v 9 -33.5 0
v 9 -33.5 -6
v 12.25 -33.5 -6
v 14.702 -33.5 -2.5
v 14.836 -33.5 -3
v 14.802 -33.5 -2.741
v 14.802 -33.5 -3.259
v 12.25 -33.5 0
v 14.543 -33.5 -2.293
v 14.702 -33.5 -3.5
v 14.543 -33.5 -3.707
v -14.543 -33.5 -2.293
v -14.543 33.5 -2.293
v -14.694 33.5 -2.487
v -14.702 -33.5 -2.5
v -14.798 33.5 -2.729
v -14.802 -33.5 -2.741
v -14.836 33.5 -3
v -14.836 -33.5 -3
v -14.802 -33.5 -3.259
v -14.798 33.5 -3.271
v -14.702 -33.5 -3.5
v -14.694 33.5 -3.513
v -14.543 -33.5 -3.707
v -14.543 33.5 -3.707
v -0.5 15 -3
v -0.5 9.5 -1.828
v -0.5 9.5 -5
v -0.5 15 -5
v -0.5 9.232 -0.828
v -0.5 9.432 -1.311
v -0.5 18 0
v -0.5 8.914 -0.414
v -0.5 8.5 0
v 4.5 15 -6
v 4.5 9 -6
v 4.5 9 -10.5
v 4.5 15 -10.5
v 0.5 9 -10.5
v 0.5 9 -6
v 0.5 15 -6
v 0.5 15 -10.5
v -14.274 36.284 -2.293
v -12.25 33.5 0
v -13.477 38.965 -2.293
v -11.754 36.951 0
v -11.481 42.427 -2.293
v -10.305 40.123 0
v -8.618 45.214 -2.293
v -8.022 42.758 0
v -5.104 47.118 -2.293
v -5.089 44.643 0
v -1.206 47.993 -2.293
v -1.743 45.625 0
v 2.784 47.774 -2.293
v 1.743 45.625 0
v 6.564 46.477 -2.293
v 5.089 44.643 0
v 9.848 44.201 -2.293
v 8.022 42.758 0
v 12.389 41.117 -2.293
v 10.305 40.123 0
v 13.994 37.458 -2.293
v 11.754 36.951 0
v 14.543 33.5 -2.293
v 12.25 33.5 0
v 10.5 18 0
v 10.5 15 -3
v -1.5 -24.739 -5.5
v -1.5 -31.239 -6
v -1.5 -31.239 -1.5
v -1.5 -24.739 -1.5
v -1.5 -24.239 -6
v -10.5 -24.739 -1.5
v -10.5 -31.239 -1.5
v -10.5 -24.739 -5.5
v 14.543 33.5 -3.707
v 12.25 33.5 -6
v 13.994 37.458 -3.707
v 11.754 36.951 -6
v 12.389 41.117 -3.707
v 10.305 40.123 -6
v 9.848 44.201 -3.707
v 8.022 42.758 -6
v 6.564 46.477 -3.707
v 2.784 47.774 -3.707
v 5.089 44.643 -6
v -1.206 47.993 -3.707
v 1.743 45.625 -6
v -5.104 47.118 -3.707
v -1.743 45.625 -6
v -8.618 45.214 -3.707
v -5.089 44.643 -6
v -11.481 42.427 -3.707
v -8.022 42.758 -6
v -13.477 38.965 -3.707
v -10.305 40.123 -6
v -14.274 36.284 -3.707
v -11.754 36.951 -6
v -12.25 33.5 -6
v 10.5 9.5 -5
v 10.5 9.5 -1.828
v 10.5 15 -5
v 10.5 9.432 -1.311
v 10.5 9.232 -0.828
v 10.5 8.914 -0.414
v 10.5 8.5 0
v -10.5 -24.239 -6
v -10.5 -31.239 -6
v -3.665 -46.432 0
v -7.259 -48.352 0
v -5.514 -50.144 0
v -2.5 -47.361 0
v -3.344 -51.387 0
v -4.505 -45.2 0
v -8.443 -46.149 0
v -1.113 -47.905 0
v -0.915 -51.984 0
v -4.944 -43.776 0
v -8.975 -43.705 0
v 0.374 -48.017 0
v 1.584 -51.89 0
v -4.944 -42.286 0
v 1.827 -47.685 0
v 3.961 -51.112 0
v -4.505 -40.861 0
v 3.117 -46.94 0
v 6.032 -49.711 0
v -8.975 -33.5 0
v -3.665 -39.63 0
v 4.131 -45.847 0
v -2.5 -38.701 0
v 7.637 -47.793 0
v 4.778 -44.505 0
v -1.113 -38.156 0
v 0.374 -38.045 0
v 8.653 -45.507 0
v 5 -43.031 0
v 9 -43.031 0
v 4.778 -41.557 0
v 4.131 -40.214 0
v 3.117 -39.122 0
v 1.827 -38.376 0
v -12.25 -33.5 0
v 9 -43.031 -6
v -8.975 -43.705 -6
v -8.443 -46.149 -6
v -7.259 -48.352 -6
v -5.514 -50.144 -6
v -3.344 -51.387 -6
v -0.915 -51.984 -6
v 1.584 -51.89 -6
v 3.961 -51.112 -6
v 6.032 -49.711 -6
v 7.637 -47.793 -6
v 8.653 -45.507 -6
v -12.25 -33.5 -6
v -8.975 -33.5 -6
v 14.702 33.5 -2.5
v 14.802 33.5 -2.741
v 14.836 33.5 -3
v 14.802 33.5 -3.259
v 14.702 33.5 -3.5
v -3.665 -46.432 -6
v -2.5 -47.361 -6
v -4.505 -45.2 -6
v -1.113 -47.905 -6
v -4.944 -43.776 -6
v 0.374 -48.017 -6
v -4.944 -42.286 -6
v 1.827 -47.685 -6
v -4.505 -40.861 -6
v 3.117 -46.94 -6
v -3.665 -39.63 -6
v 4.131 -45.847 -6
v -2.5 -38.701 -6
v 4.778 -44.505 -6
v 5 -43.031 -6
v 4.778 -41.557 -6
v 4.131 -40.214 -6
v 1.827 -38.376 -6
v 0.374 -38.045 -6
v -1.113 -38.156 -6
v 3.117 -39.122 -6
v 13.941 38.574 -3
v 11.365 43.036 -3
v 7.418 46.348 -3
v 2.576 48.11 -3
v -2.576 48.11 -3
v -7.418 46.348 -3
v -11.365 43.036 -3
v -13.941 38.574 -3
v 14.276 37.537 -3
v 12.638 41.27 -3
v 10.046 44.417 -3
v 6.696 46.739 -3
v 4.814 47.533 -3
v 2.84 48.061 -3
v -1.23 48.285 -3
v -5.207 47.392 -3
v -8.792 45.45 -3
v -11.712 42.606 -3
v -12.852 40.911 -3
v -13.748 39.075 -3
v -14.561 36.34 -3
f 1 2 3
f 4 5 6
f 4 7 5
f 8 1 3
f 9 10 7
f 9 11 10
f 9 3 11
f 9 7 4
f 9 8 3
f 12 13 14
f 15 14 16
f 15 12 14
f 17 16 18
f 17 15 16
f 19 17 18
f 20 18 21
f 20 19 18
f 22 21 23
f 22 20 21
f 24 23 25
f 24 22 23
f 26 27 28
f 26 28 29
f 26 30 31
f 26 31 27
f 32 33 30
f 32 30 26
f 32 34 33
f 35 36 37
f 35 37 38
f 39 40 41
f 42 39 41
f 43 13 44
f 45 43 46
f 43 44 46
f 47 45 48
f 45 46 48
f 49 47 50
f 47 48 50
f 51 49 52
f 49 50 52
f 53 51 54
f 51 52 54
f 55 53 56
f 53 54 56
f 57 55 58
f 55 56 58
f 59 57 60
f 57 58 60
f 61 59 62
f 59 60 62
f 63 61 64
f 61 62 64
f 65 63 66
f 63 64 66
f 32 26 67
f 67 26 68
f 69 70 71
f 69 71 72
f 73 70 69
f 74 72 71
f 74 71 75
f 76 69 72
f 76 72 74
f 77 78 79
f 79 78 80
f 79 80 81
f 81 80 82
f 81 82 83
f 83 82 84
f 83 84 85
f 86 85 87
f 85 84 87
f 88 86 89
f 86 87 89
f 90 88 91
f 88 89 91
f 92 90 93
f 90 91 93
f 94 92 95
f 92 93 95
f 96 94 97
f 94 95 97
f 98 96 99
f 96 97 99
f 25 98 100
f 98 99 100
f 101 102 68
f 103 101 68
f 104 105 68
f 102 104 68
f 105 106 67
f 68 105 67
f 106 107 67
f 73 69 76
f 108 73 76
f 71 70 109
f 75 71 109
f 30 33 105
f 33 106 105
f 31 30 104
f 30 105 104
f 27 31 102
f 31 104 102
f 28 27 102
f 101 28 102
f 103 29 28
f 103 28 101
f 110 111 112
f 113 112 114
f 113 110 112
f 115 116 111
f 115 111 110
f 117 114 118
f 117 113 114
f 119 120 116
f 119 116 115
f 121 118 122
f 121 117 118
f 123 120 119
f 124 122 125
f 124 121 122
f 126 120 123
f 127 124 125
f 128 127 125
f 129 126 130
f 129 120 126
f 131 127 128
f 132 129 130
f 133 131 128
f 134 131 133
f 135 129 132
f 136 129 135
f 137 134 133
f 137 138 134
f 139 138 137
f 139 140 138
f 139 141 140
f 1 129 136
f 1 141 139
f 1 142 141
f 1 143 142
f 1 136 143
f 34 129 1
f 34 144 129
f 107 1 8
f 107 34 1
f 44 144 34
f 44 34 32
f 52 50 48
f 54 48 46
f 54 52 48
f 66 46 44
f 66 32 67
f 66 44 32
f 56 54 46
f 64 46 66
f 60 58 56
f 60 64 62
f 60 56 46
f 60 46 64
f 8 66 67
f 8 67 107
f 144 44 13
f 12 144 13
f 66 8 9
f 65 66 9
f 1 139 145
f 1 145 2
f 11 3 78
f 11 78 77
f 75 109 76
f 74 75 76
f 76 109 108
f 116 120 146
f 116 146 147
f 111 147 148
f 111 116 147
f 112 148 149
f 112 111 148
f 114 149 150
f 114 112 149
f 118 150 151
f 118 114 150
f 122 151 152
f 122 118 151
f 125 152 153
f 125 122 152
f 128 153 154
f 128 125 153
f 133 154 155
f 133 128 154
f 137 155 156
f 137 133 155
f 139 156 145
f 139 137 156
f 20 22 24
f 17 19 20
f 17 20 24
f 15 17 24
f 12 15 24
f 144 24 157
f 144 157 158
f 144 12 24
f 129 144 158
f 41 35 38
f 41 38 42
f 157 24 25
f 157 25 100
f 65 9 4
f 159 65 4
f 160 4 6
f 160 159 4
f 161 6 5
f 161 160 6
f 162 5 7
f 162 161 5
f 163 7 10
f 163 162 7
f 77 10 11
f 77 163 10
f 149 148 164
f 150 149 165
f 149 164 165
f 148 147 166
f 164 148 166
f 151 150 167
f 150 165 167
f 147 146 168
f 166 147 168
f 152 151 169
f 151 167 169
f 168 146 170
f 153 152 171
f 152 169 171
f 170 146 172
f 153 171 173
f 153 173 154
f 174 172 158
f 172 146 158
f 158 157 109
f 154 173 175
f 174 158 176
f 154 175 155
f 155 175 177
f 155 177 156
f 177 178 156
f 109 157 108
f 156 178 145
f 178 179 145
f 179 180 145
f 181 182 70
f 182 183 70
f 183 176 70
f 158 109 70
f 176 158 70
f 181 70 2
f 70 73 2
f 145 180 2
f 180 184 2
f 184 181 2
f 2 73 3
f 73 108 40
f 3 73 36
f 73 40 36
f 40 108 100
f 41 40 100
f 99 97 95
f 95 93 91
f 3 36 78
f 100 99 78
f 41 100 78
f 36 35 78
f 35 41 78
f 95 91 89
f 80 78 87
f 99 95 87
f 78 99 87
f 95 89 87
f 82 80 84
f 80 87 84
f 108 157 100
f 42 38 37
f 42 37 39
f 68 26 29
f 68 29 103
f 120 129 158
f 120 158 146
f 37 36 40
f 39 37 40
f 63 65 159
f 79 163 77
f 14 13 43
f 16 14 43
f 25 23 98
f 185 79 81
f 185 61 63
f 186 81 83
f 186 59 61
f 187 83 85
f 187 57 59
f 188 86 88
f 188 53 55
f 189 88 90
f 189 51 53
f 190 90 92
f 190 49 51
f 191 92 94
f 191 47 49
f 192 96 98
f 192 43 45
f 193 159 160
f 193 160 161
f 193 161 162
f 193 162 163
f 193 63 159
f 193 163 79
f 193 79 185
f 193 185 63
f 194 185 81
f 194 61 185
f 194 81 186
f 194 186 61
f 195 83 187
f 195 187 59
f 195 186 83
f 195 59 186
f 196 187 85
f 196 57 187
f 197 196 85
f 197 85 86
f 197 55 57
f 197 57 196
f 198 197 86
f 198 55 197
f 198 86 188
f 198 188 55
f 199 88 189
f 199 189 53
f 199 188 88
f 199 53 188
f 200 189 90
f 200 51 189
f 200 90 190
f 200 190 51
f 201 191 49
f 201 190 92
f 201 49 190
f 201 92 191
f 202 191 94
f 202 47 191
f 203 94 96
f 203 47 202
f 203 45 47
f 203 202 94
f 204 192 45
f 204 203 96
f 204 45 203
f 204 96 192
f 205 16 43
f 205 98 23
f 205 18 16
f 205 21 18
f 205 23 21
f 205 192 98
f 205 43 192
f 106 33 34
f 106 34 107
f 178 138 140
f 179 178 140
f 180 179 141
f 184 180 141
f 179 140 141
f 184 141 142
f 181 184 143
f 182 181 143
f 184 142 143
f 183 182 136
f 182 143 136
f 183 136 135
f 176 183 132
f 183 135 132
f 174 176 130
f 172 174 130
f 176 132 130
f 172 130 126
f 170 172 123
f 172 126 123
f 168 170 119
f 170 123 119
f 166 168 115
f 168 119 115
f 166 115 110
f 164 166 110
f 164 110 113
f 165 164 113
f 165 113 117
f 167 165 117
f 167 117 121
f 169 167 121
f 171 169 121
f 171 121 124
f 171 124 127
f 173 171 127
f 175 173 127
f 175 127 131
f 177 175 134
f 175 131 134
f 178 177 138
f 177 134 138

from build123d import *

# Parameters (mm, degrees)
DODANIE_WYCI_GNI_CIE1_DEPTH = 6
SFAZOWANIE1_SIZE            = 3.5
ZAOKR_GLENIE1_R             = 1
SZKIC2_W                    = 11
SZKIC2_H                    = 5.5
WYTNIJ_WYCI_GNI_CIE1_DEPTH  = 5
SZKIC3_W                    = 9
SZKIC3_H                    = 6.5
WYTNIJ_WYCI_GNI_CIE2_DEPTH  = 4.5
SFAZOWANIE2_SIZE            = 0.5
SZKIC4_R                    = 5
DODANIE_WYCI_GNI_CIE2_DEPTH = 6
SZKIC5_W                    = 4
SZKIC5_H                    = 6
DODANIE_WYCI_GNI_CIE3_DEPTH = 4.5
SFAZOWANIE3_SIZE            = 3
SFAZOWANIE4_SIZE            = 1
ZAOKR_GLENIE2_R             = 2


with BuildPart() as part:
    # Szkic1 → Dodanie-wyciągnięcie1 (new body)
    with BuildSketch(Plane.XY):
        with BuildLine():
            ThreePointArc((15.75, 33.5), (0, 49.25), (-15.75, 33.5))
            Line((-15.75, 33.5), (15.75, 33.5))
        make_face()
        with BuildLine():
            Line((15.75, 33.5), (-15.75, 33.5))
            ThreePointArc((-15.75, 33.5), (0, 17.75), (15.75, 33.5))
        make_face()
        with BuildLine():
            ThreePointArc((15.75, 33.5), (0, 17.75), (-15.75, 33.5))
            Line((-15.75, 33.5), (-15.75, -33.5))
            Line((-15.75, -33.5), (15.75, -33.5))
            Line((15.75, -33.5), (15.75, 33.5))
        make_face()
    extrude(amount=-DODANIE_WYCI_GNI_CIE1_DEPTH)

    # Sfazowanie1
    # the kernel refuses this chamfer: 3.5 mm, written as the material it takes off along each edge
    with BuildSketch(Plane(origin=(15.75, -42.500890458, 0), x_dir=(-0.9996219169112968, 0, 0.02749587661058637), z_dir=(0, 1, 0)), Plane(origin=(-15.75, 33.5, 0), x_dir=(0.9996219169112968, 0, 0.02749587661058637), z_dir=(0, -1, 0)), Plane(origin=(-15.75, 33.5, -6), x_dir=(-0.02749587661058661, 0, 0.9996219169112968), z_dir=(0, -1, 0))) as sfazowanie1_piece_1:
        Polygon((SFAZOWANIE1_SIZE * 0.999621916911, -SFAZOWANIE1_SIZE * 0.0274958766106), (-SFAZOWANIE1_SIZE * 0.0274958766106, -SFAZOWANIE1_SIZE * 0.999621916911), (0, 0), align=None)
    extrude(amount=76.000890458, mode=Mode.SUBTRACT)
    with BuildSketch(Plane(origin=(15.75, -42.500890458, -6), x_dir=(-0.9996219169112968, 0, -0.027495876610586358), z_dir=(0, 1, 0))) as sfazowanie1_piece_2:
        Polygon((SFAZOWANIE1_SIZE * 0.999621916911, SFAZOWANIE1_SIZE * 0.0274958766106), (-SFAZOWANIE1_SIZE * 0.0274958766106, SFAZOWANIE1_SIZE * 0.999621916911), (0, 0), align=None)
    extrude(amount=76.000890458, mode=Mode.SUBTRACT)
    with BuildSketch(Plane(origin=(0, 33.5, 0), x_dir=(-1, 0, 0), z_dir=(0, -1, 0))) as sfazowanie1_piece_3:
        Polygon((15.75, SFAZOWANIE1_SIZE), (15.75 - SFAZOWANIE1_SIZE, 0), (15.75, 0), align=None)
    revolve(axis=Axis((0, 33.5, 0), (0, 0, -1)), revolution_arc=180, mode=Mode.SUBTRACT)
    with BuildSketch(Plane(origin=(0, 33.5, -6), x_dir=(1, 0, 0), z_dir=(0, -1, 0))) as sfazowanie1_piece_4:
        Polygon((15.75, SFAZOWANIE1_SIZE), (15.75 - SFAZOWANIE1_SIZE, 0), (15.75, 0), align=None)
    revolve(axis=Axis((0, 33.5, -6), (0, 0, 1)), revolution_arc=180, mode=Mode.SUBTRACT)

    # Zaokrąglenie1
    zaokr_glenie1_edges = [part.edges().sort_by_distance(p)[0] for p in [
        (-15.25, 0, -3),
        (0, 48.75, -3),
        (15.25, 0, -3),
    ]]
    fillet(zaokr_glenie1_edges, radius=ZAOKR_GLENIE1_R)

    # Szkic2 → Wytnij-wyciągnięcie1 (cut)
    with BuildSketch(Plane.XY):
        with Locations((5, 12.25)):
            Rectangle(SZKIC2_W, SZKIC2_H)
    extrude(amount=-WYTNIJ_WYCI_GNI_CIE1_DEPTH, mode=Mode.SUBTRACT)

    # Szkic3 → Wytnij-wyciągnięcie2 (cut)
    with BuildSketch(Plane(origin=(0, 0, -6), x_dir=(-1, 0, 0), z_dir=(0, 0, -1))):
        with Locations((6, -27.988867336)):
            Rectangle(SZKIC3_W, SZKIC3_H)
    extrude(amount=-WYTNIJ_WYCI_GNI_CIE2_DEPTH, mode=Mode.SUBTRACT)

    # Sfazowanie2
    sfazowanie2_edges = [part.edges().sort_by_distance(p)[0] for p in [
        (-6, -24.738867336, -6),
    ]]
    chamfer(sfazowanie2_edges, length=SFAZOWANIE2_SIZE)

    # Szkic4 → Dodanie-wyciągnięcie2 (add)
    with BuildSketch(Plane.XY):
        with BuildLine():
            Line((9, -33.5), (-8.974684649, -33.5))
            Line((-8.974684649, -33.5), (-8.974684649, -43.705386779))
            ThreePointArc((-8.974684649, -43.705386779), (0.337519003, -52.024492564), (9, -43.030823629))
            Line((9, -43.030823629), (9, -33.5))
        make_face()
        with Locations((0, -43.030823629)):
            Circle(SZKIC4_R, mode=Mode.SUBTRACT)
    extrude(amount=-DODANIE_WYCI_GNI_CIE2_DEPTH)

    # Szkic5 → Dodanie-wyciągnięcie3 (add)
    with BuildSketch(Plane(origin=(0, 0, -6), x_dir=(-1, 0, 0), z_dir=(0, 0, -1))):
        with Locations((-2.5, 12)):
            Rectangle(SZKIC5_W, SZKIC5_H)
    extrude(amount=DODANIE_WYCI_GNI_CIE3_DEPTH)

    # Sfazowanie3
    sfazowanie3_edges = [part.edges().sort_by_distance(p)[0] for p in [
        (5, 15, 0),
    ]]
    chamfer(sfazowanie3_edges, length=SFAZOWANIE3_SIZE)

    # Sfazowanie4
    sfazowanie4_edges = [part.edges().sort_by_distance(p)[0] for p in [
        (5, 9.5, 0),
    ]]
    chamfer(sfazowanie4_edges, length=SFAZOWANIE4_SIZE)

    # Zaokrąglenie2
    zaokr_glenie2_edges = [part.edges().sort_by_distance(p)[0] for p in [
        (5, 9.5, -1),
    ]]
    fillet(zaokr_glenie2_edges, radius=ZAOKR_GLENIE2_R)


solid = part.part
